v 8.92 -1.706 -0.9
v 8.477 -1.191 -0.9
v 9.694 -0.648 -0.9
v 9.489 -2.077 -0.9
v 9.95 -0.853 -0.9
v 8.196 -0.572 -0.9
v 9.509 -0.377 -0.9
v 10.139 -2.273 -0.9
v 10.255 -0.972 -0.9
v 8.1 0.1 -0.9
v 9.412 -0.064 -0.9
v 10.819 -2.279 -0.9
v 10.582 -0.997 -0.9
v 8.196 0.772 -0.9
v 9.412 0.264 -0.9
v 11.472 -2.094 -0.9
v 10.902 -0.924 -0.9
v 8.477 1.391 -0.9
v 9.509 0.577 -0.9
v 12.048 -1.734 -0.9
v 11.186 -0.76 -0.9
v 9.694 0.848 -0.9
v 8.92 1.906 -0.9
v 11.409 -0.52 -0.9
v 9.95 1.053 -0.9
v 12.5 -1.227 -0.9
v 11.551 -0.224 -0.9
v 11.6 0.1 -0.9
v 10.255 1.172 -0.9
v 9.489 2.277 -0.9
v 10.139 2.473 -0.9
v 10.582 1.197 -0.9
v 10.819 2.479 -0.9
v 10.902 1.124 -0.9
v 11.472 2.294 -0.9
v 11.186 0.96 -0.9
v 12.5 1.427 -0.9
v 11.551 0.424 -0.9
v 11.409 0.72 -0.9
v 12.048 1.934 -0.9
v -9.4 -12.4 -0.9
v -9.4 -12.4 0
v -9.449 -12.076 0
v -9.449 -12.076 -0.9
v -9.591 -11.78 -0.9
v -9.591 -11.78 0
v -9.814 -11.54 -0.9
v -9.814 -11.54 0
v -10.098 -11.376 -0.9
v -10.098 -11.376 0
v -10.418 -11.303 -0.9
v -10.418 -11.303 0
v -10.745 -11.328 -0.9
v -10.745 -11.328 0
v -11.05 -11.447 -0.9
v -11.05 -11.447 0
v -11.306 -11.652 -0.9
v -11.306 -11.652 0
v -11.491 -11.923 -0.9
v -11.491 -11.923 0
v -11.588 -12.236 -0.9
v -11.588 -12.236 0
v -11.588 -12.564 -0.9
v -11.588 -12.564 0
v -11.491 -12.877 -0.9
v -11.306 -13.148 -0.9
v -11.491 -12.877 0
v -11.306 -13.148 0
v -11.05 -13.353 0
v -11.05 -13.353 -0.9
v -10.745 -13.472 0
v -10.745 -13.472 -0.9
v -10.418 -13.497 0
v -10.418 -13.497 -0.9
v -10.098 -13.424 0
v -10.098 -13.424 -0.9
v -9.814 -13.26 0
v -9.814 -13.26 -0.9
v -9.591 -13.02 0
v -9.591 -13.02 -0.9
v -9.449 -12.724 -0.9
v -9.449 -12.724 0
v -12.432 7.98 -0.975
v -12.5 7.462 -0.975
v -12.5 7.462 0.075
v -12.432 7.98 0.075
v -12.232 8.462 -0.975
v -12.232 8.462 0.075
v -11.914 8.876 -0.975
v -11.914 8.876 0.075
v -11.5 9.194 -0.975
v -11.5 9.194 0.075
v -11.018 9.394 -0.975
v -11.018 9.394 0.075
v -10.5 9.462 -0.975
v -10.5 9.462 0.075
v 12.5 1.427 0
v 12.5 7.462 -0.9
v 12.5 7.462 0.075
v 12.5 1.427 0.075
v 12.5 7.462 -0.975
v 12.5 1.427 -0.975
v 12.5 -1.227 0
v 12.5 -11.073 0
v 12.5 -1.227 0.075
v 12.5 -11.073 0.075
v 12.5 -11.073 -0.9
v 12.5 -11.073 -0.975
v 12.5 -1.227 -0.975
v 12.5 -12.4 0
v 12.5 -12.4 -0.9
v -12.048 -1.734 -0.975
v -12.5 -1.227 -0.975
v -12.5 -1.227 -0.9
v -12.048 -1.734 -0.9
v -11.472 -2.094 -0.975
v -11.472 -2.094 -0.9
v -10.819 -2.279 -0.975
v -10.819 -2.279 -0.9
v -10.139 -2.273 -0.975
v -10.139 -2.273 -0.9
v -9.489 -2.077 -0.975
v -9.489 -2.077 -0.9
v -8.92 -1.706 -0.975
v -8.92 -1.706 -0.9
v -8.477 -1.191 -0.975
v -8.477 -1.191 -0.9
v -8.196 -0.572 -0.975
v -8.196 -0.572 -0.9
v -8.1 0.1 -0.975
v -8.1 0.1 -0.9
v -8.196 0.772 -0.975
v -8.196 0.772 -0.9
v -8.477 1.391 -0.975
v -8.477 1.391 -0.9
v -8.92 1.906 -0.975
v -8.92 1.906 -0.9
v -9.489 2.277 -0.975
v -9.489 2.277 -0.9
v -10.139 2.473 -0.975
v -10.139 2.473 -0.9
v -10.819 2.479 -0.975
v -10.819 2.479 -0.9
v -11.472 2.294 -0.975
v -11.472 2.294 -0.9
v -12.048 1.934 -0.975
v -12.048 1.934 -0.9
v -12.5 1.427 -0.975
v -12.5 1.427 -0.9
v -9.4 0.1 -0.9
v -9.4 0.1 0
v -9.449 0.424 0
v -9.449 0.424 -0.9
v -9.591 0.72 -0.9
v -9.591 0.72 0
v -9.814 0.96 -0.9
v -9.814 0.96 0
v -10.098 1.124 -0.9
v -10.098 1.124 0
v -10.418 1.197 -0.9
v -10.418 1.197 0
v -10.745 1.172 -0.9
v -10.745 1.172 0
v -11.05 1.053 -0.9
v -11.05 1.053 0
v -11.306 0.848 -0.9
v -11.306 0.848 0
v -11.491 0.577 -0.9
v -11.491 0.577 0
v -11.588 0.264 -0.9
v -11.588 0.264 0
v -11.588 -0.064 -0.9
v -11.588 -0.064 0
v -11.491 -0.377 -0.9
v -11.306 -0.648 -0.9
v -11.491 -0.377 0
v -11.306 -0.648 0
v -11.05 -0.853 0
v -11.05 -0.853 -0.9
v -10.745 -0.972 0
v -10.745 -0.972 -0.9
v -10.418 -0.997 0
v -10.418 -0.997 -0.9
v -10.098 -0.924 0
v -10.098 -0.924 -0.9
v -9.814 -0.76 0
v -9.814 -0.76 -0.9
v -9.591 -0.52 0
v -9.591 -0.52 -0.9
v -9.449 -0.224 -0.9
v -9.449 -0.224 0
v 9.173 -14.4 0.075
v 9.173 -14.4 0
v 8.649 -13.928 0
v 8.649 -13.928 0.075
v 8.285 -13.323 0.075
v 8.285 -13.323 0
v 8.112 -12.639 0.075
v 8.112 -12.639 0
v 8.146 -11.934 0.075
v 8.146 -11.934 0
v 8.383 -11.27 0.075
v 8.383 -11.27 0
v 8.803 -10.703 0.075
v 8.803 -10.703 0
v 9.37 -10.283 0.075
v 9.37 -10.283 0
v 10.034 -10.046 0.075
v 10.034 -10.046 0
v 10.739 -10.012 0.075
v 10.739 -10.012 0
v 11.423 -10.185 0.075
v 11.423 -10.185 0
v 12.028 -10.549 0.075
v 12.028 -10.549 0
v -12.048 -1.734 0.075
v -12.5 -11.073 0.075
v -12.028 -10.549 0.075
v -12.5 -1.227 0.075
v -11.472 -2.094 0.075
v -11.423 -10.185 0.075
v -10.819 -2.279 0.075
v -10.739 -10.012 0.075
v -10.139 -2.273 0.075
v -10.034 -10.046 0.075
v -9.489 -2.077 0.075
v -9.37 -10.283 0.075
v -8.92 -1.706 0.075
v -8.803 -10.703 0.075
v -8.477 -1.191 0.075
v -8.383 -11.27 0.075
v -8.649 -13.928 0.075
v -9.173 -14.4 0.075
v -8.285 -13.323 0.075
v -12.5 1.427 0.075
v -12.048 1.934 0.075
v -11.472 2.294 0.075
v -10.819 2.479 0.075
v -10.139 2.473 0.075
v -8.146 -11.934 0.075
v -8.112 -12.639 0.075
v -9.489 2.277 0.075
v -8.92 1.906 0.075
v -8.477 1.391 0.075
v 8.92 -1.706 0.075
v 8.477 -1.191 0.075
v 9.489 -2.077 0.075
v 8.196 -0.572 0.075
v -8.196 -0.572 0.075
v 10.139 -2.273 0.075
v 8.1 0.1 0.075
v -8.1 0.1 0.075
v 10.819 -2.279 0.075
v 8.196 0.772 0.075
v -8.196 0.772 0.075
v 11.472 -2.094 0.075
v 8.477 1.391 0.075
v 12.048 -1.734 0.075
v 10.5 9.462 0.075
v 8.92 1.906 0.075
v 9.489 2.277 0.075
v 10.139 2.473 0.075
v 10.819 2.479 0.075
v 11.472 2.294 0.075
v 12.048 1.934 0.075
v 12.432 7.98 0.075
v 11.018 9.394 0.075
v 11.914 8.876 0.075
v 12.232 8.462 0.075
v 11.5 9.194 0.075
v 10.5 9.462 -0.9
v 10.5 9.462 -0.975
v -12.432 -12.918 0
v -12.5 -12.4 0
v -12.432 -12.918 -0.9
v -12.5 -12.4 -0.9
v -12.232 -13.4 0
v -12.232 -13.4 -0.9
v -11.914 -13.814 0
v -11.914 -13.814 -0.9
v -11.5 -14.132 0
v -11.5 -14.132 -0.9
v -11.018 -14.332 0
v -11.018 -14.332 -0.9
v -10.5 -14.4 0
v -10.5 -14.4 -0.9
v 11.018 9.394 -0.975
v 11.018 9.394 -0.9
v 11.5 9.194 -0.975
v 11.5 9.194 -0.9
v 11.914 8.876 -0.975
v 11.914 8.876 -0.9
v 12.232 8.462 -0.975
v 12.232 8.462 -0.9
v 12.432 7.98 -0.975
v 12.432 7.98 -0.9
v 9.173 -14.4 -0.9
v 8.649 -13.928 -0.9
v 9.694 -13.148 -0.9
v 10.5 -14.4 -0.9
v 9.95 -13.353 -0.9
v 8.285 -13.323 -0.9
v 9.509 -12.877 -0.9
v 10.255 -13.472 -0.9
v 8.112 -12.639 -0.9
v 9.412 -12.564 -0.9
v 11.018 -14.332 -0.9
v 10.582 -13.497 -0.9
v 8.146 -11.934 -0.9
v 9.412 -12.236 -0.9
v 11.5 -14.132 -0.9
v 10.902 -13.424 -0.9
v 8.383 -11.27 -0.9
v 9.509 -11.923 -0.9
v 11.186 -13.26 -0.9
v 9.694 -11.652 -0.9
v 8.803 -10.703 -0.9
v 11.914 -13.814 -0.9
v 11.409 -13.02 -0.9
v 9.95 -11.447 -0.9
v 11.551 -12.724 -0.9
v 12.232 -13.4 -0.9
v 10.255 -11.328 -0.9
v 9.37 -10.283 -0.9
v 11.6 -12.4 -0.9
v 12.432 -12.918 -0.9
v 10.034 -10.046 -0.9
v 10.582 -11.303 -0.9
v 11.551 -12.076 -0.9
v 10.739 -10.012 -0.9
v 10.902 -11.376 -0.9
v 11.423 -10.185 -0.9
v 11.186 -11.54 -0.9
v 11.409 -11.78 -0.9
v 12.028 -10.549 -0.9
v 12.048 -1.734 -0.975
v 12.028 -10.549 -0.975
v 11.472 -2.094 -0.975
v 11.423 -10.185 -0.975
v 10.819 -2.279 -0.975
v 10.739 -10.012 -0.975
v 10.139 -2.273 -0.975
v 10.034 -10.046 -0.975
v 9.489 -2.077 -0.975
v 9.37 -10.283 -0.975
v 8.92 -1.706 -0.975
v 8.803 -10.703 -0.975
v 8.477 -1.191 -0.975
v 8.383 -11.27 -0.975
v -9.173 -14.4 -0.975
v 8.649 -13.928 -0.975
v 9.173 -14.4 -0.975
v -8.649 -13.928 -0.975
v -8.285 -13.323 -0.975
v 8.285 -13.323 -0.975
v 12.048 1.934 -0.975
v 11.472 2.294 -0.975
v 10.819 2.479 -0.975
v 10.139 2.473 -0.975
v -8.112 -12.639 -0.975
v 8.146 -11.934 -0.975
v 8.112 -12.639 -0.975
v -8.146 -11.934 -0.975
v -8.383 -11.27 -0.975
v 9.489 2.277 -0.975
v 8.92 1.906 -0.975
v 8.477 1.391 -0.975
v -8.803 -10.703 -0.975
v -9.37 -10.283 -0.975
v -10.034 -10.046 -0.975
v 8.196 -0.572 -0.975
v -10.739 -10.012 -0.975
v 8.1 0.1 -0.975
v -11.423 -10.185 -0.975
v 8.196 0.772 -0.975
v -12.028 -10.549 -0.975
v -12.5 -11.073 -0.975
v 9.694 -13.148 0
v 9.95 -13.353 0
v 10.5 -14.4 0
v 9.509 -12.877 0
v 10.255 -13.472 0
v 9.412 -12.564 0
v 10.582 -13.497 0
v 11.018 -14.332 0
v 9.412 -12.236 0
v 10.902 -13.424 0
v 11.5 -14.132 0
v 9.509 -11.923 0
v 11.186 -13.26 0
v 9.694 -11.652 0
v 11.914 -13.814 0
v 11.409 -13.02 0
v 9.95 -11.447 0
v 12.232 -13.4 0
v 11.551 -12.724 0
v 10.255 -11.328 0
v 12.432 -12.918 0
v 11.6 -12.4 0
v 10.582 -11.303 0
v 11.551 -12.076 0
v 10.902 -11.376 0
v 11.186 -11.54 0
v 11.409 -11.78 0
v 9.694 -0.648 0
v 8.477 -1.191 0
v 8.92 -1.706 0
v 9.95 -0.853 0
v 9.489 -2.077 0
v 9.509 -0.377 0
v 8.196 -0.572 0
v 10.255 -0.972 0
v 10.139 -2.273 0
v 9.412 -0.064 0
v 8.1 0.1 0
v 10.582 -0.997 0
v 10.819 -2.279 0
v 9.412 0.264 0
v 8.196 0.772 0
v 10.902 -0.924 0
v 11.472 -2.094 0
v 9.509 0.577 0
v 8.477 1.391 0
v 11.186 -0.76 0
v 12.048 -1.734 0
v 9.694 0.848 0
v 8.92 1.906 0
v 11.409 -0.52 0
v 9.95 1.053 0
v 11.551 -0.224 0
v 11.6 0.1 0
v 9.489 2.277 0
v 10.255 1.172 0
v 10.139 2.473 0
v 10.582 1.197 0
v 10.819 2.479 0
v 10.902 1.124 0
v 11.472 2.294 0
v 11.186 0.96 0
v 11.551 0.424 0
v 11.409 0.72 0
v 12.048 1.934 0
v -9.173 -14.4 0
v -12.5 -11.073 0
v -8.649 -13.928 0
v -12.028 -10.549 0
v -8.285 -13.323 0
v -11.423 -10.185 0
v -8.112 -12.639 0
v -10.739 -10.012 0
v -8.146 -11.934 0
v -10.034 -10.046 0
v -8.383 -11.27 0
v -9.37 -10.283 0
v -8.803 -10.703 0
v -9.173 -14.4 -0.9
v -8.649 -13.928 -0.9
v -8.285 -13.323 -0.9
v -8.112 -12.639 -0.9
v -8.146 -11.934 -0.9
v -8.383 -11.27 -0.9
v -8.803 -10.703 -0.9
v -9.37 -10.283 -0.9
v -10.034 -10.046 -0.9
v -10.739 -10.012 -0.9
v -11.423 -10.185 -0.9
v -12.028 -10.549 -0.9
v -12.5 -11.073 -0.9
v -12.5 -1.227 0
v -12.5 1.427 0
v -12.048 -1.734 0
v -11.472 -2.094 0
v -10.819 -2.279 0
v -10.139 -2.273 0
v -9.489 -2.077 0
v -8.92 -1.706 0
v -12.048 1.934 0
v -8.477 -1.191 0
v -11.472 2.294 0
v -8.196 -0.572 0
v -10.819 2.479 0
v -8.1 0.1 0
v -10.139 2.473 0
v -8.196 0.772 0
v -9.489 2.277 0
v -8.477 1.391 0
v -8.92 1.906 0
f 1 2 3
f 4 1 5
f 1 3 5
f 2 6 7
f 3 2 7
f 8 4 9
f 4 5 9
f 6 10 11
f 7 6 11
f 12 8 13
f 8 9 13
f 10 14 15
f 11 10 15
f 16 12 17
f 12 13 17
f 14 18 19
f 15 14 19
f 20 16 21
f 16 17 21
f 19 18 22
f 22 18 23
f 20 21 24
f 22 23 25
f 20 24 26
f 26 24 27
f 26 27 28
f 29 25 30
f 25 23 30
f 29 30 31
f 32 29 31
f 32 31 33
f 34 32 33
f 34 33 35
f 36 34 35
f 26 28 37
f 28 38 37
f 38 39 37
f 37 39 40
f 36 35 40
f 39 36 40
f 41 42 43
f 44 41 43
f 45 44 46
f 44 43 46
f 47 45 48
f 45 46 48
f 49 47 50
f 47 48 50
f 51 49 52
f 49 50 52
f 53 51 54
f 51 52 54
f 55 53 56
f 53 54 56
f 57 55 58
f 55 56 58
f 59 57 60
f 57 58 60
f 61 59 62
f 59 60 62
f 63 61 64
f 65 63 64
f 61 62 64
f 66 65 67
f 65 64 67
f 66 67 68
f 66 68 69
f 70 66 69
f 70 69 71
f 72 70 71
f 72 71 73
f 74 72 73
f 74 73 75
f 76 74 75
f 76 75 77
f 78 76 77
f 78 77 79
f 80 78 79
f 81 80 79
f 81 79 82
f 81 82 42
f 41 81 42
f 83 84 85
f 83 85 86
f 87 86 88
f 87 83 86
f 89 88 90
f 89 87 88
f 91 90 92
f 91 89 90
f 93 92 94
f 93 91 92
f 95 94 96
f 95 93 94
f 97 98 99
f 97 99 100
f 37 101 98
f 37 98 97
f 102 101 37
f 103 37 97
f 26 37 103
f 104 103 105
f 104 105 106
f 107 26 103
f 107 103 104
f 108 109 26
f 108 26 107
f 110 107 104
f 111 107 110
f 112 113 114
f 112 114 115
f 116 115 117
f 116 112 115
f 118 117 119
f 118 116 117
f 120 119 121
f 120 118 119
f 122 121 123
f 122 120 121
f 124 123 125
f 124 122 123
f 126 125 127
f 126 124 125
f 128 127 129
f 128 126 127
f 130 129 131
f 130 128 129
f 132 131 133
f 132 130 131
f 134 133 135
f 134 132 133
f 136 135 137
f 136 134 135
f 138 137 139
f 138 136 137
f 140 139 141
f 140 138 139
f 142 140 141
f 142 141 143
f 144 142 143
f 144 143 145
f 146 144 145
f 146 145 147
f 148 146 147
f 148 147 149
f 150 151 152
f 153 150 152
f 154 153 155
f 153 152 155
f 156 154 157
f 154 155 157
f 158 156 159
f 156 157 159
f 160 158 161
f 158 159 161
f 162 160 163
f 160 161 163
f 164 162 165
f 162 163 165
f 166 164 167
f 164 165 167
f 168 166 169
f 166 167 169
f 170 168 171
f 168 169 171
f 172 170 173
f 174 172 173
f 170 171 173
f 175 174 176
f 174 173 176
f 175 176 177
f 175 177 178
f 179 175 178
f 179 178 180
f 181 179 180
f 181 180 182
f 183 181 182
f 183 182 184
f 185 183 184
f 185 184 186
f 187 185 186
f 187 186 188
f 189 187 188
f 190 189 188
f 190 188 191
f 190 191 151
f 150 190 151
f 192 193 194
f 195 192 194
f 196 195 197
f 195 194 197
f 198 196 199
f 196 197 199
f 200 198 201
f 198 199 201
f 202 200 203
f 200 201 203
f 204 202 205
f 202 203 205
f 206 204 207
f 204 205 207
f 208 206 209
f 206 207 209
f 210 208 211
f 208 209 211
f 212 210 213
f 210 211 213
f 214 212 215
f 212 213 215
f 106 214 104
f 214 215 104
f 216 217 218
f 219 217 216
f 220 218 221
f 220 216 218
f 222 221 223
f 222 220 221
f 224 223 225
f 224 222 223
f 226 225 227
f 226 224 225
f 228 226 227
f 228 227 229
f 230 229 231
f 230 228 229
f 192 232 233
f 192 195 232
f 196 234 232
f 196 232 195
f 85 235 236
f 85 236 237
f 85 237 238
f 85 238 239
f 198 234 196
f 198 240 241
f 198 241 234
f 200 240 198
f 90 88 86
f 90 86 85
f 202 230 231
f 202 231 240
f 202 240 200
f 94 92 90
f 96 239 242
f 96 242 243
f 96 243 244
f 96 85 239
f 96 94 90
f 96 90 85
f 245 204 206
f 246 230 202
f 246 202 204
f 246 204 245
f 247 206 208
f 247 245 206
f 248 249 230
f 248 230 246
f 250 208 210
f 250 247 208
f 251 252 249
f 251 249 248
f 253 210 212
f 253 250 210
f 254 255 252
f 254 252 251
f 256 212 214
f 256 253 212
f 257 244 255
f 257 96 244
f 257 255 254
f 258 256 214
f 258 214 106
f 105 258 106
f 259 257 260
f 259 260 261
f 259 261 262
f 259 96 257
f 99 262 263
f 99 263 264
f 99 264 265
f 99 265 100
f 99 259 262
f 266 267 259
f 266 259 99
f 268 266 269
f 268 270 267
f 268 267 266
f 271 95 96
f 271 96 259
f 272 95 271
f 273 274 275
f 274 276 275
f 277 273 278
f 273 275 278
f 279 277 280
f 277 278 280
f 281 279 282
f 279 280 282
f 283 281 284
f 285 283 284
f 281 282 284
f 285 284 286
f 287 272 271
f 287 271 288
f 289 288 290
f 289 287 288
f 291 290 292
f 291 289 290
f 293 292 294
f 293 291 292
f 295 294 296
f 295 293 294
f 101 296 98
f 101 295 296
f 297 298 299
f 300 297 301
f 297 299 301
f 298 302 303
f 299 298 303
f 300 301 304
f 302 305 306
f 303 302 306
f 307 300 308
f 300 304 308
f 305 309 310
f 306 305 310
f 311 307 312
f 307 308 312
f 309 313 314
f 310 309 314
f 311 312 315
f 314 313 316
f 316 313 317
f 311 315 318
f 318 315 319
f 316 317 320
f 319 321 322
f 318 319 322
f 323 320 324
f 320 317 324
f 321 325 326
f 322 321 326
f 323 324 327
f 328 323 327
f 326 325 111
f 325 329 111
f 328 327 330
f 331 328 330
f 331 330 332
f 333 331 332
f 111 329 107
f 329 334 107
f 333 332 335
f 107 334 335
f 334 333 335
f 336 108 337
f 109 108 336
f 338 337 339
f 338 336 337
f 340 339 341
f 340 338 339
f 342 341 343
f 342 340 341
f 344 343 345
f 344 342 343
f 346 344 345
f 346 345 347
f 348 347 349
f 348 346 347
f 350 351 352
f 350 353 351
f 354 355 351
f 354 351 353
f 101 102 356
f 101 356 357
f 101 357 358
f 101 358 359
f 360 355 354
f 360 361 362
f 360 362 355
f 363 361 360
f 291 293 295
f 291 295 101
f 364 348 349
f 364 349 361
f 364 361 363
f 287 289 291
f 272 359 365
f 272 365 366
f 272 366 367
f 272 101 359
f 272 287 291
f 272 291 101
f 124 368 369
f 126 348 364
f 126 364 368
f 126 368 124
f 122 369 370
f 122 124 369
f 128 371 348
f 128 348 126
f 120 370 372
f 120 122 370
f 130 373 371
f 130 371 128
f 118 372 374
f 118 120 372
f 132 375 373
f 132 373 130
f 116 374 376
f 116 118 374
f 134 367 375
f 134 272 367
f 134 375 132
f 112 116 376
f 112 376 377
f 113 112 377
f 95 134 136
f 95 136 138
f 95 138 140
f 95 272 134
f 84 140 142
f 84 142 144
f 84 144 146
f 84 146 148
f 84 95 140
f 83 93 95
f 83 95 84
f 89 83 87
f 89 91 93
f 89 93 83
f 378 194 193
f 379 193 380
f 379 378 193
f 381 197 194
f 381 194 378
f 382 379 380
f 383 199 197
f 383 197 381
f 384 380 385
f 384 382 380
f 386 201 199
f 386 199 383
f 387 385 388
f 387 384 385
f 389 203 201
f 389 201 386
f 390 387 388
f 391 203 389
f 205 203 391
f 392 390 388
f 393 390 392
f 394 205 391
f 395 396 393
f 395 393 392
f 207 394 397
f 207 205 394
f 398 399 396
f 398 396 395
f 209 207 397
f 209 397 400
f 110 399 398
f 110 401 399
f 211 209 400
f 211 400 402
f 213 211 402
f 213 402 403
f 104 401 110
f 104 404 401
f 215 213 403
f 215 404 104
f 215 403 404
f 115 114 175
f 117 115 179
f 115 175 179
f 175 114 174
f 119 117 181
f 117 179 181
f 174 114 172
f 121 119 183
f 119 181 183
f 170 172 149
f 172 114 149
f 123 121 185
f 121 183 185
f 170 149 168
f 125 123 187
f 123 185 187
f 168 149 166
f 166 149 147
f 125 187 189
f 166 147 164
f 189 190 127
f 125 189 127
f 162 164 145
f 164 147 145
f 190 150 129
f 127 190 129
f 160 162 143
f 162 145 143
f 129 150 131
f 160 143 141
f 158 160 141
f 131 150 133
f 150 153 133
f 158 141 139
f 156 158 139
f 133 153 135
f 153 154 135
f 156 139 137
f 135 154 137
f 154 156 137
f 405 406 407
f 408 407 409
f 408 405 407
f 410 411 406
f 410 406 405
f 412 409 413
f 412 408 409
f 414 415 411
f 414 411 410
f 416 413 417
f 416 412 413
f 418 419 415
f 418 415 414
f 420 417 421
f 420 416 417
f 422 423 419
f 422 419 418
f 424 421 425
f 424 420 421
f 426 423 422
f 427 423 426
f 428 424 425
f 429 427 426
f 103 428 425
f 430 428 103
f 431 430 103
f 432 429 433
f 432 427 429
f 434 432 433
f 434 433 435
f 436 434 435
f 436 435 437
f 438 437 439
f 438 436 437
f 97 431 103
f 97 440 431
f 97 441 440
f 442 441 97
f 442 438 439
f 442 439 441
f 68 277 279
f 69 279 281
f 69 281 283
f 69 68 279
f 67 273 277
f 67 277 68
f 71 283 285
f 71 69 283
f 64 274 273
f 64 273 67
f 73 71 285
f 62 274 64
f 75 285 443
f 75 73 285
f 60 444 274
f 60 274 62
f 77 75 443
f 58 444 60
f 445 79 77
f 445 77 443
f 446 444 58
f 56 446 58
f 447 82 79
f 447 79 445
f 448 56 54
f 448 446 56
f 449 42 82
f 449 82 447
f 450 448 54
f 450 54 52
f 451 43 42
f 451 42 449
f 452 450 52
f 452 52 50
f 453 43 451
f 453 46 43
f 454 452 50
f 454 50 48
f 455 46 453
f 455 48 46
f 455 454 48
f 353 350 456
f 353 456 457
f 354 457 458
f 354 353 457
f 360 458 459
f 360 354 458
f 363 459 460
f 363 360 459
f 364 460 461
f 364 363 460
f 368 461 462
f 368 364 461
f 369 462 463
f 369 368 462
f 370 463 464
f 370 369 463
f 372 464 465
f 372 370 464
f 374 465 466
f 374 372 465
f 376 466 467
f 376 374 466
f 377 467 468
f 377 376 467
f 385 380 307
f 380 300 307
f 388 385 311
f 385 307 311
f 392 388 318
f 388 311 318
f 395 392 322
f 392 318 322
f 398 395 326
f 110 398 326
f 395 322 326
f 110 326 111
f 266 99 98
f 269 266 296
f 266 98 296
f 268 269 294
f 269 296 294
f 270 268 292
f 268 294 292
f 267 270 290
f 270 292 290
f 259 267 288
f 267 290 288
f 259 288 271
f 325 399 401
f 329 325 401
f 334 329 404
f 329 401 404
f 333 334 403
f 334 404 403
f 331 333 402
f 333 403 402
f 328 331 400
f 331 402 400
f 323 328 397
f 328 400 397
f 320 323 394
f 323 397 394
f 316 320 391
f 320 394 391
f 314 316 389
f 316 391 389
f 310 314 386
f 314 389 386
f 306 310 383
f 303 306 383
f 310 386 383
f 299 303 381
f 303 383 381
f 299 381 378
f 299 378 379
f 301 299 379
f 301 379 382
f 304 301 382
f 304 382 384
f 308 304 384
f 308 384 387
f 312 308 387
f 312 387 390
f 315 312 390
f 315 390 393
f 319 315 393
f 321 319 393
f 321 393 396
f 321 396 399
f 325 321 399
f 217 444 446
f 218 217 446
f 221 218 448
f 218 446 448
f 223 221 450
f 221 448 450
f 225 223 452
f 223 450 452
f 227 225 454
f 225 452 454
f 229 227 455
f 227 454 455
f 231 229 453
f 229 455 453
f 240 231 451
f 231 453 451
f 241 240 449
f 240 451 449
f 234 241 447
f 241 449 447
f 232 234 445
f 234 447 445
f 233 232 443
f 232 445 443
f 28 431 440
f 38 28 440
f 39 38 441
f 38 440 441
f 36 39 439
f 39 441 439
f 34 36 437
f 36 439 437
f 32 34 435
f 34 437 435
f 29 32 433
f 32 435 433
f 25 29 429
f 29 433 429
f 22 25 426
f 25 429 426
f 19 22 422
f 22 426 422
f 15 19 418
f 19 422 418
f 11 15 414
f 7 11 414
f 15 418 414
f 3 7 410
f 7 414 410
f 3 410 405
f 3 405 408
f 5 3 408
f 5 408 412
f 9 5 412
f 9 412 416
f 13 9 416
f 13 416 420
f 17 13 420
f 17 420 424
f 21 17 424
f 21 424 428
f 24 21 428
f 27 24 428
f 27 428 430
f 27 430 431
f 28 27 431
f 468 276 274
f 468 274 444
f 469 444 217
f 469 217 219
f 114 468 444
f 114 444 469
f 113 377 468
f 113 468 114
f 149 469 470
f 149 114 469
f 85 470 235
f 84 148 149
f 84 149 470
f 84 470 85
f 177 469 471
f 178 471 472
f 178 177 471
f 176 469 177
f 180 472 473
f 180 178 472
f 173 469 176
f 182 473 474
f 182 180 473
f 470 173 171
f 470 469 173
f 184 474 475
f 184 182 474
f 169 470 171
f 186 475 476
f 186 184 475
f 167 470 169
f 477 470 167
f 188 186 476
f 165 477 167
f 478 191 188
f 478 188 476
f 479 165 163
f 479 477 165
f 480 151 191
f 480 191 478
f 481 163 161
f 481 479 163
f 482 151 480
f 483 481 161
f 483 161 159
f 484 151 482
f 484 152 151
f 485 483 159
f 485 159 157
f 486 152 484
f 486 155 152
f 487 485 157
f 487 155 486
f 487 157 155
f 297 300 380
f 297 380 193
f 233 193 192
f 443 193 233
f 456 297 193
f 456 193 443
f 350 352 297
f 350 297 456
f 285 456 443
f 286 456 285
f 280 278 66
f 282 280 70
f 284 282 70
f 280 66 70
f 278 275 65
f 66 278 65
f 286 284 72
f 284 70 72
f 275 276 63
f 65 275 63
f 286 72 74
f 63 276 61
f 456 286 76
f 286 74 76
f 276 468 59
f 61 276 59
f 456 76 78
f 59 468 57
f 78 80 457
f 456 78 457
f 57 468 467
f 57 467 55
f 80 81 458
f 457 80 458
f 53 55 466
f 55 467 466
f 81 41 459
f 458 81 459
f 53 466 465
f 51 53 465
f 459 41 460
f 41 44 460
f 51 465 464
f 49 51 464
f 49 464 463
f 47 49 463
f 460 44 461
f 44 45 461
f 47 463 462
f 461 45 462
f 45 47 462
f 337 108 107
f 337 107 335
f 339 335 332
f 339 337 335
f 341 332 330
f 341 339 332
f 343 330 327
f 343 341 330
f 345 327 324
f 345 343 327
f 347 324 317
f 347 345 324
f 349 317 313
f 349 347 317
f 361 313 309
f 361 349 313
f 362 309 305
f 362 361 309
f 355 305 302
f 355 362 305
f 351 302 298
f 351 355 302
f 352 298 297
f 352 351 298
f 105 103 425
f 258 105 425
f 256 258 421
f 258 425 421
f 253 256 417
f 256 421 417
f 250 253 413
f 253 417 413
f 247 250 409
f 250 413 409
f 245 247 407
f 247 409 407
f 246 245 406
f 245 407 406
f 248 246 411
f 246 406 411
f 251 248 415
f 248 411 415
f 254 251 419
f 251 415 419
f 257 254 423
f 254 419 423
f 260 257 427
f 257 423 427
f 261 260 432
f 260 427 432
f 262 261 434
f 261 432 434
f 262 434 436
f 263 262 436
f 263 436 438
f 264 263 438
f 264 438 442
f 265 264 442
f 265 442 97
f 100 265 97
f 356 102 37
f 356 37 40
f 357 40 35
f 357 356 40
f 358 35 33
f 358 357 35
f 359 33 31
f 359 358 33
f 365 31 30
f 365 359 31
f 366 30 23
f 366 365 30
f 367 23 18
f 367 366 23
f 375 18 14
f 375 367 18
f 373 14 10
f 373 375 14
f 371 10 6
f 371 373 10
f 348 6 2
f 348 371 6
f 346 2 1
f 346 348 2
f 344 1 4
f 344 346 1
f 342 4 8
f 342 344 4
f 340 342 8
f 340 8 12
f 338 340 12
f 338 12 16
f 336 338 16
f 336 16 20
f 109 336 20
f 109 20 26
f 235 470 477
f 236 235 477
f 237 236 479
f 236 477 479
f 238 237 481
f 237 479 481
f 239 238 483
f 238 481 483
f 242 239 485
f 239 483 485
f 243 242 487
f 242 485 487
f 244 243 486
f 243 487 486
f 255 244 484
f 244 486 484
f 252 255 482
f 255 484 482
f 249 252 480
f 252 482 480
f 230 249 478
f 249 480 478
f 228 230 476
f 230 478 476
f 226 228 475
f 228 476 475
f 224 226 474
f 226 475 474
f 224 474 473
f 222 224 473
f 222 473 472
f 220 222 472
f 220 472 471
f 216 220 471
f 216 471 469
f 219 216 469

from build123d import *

# Parameters (mm, degrees)
SKETCH3_W           = 25
SKETCH3_H           = 23.862
BOSS_EXTRUDE1_DEPTH = 0.9
FILLET1_R           = 2
SKETCH4_R           = 1.1
CUT_EXTRUDE1_DEPTH  = 20.089787846
BOSS_EXTRUDE2_DEPTH = 0.075
BOSS_EXTRUDE3_START = 0.075
BOSS_EXTRUDE3_DEPTH = 0.075


with BuildPart() as part:
    # Sketch3 → Boss-Extrude1 (new body)
    with BuildSketch(Plane.XY):
        with Locations((0, -2.469)):
            Rectangle(SKETCH3_W, SKETCH3_H)
    extrude(amount=-BOSS_EXTRUDE1_DEPTH)

    # Fillet1
    fillet1_edges = [part.edges().sort_by_distance(p)[0] for p in [
        (-12.5, 9.462, -0.45),
        (12.5, 9.462, -0.45),
        (12.5, -14.4, -0.45),
        (-12.5, -14.4, -0.45),
    ]]
    fillet(fillet1_edges, radius=FILLET1_R)

    # Sketch4 → Cut-Extrude1 (cut, through all)
    with BuildSketch(Plane.XY):
        with Locations((-10.5, 0.1)):
            Circle(SKETCH4_R)
        with Locations((-10.5, -12.4)):
            Circle(SKETCH4_R)
        with Locations((10.5, -12.4)):
            Circle(SKETCH4_R)
        with Locations((10.5, 0.1)):
            Circle(SKETCH4_R)
    extrude(amount=-CUT_EXTRUDE1_DEPTH, mode=Mode.SUBTRACT)

    # Sketch5 → Boss-Extrude2 (add)
    with BuildSketch(Plane.XY):
        with BuildLine():
            Line((12.5, 1.426649916), (12.5, 7.462))
            ThreePointArc((12.5, 7.462), (11.914213562, 8.876213562), (10.5, 9.462))
            Line((10.5, 9.462), (-10.5, 9.462))
            ThreePointArc((-10.5, 9.462), (-11.914213562, 8.876213562), (-12.5, 7.462))
            Line((-12.5, 7.462), (-12.5, 1.426649916))
            ThreePointArc((-12.5, 1.426649916), (-8.1, 0.1), (-12.5, -1.226649916))
            Line((-12.5, -1.226649916), (-12.5, -11.073350084))
            ThreePointArc((-12.5, -11.073350084), (-8.802943725, -10.702943725), (-9.173350084, -14.4))
            Line((-9.173350084, -14.4), (9.173350084, -14.4))
            ThreePointArc((9.173350084, -14.4), (8.802943725, -10.702943725), (12.5, -11.073350084))
            Line((12.5, -11.073350084), (12.5, -1.226649916))
            ThreePointArc((12.5, -1.226649916), (8.1, 0.1), (12.5, 1.426649916))
        make_face()
    extrude(amount=BOSS_EXTRUDE2_DEPTH)

    # Sketch6 → Boss-Extrude3 (add)
    with BuildSketch(Plane(origin=(0, 0, -0.9), x_dir=(-1, 0, 0), z_dir=(0, 0, -1)).offset(BOSS_EXTRUDE3_START)):
        with BuildLine():
            Line((12.5, 1.426649916), (12.5, 7.462))
            ThreePointArc((12.5, 7.462), (11.914213562, 8.876213562), (10.5, 9.462))
            Line((10.5, 9.462), (-10.5, 9.462))
            ThreePointArc((-10.5, 9.462), (-11.914213562, 8.876213562), (-12.5, 7.462))
            Line((-12.5, 7.462), (-12.5, 1.426649916))
            ThreePointArc((-12.5, 1.426649916), (-8.1, 0.1), (-12.5, -1.226649916))
            Line((-12.5, -1.226649916), (-12.5, -11.073350084))
            ThreePointArc((-12.5, -11.073350084), (-8.802943725, -10.702943725), (-9.173350084, -14.4))
            Line((-9.173350084, -14.4), (9.173350084, -14.4))
            ThreePointArc((9.173350084, -14.4), (8.802943725, -10.702943725), (12.5, -11.073350084))
            Line((12.5, -11.073350084), (12.5, -1.226649916))
            ThreePointArc((12.5, -1.226649916), (8.1, 0.1), (12.5, 1.426649916))
        make_face()
    extrude(amount=-BOSS_EXTRUDE3_DEPTH)


solid = part.part
